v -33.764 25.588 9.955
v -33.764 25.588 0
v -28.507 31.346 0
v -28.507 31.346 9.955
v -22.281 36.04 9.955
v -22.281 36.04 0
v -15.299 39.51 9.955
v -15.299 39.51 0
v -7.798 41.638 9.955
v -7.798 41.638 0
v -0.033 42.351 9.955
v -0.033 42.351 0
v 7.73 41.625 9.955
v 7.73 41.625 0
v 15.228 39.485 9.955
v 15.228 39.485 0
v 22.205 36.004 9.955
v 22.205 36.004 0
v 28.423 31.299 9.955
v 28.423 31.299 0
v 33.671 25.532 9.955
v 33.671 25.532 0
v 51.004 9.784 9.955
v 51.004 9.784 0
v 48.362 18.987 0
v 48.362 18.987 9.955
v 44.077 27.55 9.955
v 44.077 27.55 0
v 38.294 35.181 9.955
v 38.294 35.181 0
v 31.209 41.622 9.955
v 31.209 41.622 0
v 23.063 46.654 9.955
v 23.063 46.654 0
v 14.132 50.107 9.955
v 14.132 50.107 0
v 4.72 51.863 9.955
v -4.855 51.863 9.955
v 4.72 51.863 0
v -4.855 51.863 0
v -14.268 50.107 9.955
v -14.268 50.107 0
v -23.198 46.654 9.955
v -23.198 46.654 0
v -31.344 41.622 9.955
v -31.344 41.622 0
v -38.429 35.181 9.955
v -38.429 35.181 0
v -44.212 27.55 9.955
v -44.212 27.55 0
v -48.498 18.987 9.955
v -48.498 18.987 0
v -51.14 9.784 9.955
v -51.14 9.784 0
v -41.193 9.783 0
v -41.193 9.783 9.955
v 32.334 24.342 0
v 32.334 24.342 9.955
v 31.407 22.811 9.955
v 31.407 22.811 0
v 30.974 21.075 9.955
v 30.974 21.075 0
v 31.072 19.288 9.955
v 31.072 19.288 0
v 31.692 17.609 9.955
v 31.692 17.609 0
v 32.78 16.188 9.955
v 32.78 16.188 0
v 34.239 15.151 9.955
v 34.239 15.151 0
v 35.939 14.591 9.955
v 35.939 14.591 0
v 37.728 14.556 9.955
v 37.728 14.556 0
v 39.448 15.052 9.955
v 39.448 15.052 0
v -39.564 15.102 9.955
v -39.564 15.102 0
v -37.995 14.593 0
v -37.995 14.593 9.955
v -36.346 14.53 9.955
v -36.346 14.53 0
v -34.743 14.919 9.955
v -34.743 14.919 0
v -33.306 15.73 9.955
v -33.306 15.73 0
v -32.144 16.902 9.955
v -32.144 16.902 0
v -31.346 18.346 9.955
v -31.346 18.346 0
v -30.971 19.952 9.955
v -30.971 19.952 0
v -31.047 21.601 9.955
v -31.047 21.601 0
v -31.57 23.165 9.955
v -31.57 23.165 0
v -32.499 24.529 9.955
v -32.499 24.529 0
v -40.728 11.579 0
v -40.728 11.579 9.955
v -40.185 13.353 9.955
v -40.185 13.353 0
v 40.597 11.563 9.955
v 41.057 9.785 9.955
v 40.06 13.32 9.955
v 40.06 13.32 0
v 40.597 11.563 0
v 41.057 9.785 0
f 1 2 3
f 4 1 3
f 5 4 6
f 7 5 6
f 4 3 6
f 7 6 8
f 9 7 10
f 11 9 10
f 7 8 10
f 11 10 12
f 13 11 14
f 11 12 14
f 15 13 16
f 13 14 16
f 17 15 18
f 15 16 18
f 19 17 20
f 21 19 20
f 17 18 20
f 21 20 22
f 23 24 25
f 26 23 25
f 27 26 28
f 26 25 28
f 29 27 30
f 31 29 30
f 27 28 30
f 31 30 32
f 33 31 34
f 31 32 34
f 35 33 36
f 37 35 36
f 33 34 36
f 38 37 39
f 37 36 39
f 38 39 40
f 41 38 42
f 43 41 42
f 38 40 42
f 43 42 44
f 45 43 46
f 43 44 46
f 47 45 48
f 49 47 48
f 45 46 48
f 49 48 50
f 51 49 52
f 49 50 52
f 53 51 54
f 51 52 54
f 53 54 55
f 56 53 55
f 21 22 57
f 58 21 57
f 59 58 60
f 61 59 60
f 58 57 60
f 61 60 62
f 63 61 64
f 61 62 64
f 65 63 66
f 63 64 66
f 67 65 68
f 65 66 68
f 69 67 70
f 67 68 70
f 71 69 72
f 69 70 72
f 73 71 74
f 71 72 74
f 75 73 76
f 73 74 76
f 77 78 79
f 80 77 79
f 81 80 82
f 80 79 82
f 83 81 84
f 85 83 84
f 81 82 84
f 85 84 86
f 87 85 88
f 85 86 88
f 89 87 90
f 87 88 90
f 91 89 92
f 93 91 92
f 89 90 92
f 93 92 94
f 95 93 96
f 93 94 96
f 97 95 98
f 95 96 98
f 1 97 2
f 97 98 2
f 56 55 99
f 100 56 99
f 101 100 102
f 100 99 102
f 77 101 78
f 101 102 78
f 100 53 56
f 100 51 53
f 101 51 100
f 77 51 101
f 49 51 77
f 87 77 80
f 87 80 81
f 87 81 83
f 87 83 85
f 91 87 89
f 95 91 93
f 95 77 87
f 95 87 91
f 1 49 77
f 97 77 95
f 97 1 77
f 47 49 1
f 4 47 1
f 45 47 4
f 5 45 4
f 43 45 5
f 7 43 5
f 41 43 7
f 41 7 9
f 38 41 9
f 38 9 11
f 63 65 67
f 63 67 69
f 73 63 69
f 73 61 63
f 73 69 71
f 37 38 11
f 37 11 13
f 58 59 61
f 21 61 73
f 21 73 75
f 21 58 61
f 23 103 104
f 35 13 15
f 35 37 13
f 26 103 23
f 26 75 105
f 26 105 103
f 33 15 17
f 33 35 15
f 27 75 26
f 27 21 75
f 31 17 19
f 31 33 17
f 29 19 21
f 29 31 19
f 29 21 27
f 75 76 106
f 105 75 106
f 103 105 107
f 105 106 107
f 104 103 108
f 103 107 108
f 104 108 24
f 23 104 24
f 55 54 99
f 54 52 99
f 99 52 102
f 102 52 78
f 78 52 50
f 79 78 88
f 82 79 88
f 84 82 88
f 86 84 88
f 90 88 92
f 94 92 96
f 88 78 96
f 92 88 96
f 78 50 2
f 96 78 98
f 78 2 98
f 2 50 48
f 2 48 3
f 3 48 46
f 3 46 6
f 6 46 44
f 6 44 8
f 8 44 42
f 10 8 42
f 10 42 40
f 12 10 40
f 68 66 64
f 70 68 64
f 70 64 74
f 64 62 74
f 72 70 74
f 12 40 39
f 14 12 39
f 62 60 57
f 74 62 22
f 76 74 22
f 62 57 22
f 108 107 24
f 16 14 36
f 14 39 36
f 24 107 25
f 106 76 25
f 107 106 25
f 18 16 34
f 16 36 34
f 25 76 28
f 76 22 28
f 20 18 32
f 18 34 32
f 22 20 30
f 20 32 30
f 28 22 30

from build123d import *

# Parameters (mm, degrees)
BOSS_EXTRUDE6_DEPTH = 9.955320875


with BuildPart() as part:
    # Sketch1 → Boss-Extrude6 (new body)
    with BuildSketch(Plane.XY):
        with BuildLine():
            Line((-51.139816159, 9.78390553), (-41.19267445, 9.782935976))
            ThreePointArc((-41.19267445, 9.782935976), (-40.46615036, 12.469308879), (-39.564350519, 15.102024906))
            ThreePointArc((-39.564350519, 15.102024906), (-31.695161559, 17.596213673), (-33.764455715, 25.587654982))
            ThreePointArc((-33.764455715, 25.587654982), (-0.032994911, 42.351160958), (33.670827225, 25.532155221))
            ThreePointArc((33.670827225, 25.532155221), (31.692118999, 17.608927269), (39.44794108, 15.051574876))
            ThreePointArc((39.44794108, 15.051574876), (40.338215404, 12.444464282), (41.056685691, 9.784875128))
            Line((41.056685691, 9.784875128), (51.004283921, 9.78390553))
            ThreePointArc((51.004283921, 9.78390553), (-0.067766119, 52.083843354), (-51.139816159, 9.78390553))
        make_face()
    extrude(amount=BOSS_EXTRUDE6_DEPTH)


solid = part.part
